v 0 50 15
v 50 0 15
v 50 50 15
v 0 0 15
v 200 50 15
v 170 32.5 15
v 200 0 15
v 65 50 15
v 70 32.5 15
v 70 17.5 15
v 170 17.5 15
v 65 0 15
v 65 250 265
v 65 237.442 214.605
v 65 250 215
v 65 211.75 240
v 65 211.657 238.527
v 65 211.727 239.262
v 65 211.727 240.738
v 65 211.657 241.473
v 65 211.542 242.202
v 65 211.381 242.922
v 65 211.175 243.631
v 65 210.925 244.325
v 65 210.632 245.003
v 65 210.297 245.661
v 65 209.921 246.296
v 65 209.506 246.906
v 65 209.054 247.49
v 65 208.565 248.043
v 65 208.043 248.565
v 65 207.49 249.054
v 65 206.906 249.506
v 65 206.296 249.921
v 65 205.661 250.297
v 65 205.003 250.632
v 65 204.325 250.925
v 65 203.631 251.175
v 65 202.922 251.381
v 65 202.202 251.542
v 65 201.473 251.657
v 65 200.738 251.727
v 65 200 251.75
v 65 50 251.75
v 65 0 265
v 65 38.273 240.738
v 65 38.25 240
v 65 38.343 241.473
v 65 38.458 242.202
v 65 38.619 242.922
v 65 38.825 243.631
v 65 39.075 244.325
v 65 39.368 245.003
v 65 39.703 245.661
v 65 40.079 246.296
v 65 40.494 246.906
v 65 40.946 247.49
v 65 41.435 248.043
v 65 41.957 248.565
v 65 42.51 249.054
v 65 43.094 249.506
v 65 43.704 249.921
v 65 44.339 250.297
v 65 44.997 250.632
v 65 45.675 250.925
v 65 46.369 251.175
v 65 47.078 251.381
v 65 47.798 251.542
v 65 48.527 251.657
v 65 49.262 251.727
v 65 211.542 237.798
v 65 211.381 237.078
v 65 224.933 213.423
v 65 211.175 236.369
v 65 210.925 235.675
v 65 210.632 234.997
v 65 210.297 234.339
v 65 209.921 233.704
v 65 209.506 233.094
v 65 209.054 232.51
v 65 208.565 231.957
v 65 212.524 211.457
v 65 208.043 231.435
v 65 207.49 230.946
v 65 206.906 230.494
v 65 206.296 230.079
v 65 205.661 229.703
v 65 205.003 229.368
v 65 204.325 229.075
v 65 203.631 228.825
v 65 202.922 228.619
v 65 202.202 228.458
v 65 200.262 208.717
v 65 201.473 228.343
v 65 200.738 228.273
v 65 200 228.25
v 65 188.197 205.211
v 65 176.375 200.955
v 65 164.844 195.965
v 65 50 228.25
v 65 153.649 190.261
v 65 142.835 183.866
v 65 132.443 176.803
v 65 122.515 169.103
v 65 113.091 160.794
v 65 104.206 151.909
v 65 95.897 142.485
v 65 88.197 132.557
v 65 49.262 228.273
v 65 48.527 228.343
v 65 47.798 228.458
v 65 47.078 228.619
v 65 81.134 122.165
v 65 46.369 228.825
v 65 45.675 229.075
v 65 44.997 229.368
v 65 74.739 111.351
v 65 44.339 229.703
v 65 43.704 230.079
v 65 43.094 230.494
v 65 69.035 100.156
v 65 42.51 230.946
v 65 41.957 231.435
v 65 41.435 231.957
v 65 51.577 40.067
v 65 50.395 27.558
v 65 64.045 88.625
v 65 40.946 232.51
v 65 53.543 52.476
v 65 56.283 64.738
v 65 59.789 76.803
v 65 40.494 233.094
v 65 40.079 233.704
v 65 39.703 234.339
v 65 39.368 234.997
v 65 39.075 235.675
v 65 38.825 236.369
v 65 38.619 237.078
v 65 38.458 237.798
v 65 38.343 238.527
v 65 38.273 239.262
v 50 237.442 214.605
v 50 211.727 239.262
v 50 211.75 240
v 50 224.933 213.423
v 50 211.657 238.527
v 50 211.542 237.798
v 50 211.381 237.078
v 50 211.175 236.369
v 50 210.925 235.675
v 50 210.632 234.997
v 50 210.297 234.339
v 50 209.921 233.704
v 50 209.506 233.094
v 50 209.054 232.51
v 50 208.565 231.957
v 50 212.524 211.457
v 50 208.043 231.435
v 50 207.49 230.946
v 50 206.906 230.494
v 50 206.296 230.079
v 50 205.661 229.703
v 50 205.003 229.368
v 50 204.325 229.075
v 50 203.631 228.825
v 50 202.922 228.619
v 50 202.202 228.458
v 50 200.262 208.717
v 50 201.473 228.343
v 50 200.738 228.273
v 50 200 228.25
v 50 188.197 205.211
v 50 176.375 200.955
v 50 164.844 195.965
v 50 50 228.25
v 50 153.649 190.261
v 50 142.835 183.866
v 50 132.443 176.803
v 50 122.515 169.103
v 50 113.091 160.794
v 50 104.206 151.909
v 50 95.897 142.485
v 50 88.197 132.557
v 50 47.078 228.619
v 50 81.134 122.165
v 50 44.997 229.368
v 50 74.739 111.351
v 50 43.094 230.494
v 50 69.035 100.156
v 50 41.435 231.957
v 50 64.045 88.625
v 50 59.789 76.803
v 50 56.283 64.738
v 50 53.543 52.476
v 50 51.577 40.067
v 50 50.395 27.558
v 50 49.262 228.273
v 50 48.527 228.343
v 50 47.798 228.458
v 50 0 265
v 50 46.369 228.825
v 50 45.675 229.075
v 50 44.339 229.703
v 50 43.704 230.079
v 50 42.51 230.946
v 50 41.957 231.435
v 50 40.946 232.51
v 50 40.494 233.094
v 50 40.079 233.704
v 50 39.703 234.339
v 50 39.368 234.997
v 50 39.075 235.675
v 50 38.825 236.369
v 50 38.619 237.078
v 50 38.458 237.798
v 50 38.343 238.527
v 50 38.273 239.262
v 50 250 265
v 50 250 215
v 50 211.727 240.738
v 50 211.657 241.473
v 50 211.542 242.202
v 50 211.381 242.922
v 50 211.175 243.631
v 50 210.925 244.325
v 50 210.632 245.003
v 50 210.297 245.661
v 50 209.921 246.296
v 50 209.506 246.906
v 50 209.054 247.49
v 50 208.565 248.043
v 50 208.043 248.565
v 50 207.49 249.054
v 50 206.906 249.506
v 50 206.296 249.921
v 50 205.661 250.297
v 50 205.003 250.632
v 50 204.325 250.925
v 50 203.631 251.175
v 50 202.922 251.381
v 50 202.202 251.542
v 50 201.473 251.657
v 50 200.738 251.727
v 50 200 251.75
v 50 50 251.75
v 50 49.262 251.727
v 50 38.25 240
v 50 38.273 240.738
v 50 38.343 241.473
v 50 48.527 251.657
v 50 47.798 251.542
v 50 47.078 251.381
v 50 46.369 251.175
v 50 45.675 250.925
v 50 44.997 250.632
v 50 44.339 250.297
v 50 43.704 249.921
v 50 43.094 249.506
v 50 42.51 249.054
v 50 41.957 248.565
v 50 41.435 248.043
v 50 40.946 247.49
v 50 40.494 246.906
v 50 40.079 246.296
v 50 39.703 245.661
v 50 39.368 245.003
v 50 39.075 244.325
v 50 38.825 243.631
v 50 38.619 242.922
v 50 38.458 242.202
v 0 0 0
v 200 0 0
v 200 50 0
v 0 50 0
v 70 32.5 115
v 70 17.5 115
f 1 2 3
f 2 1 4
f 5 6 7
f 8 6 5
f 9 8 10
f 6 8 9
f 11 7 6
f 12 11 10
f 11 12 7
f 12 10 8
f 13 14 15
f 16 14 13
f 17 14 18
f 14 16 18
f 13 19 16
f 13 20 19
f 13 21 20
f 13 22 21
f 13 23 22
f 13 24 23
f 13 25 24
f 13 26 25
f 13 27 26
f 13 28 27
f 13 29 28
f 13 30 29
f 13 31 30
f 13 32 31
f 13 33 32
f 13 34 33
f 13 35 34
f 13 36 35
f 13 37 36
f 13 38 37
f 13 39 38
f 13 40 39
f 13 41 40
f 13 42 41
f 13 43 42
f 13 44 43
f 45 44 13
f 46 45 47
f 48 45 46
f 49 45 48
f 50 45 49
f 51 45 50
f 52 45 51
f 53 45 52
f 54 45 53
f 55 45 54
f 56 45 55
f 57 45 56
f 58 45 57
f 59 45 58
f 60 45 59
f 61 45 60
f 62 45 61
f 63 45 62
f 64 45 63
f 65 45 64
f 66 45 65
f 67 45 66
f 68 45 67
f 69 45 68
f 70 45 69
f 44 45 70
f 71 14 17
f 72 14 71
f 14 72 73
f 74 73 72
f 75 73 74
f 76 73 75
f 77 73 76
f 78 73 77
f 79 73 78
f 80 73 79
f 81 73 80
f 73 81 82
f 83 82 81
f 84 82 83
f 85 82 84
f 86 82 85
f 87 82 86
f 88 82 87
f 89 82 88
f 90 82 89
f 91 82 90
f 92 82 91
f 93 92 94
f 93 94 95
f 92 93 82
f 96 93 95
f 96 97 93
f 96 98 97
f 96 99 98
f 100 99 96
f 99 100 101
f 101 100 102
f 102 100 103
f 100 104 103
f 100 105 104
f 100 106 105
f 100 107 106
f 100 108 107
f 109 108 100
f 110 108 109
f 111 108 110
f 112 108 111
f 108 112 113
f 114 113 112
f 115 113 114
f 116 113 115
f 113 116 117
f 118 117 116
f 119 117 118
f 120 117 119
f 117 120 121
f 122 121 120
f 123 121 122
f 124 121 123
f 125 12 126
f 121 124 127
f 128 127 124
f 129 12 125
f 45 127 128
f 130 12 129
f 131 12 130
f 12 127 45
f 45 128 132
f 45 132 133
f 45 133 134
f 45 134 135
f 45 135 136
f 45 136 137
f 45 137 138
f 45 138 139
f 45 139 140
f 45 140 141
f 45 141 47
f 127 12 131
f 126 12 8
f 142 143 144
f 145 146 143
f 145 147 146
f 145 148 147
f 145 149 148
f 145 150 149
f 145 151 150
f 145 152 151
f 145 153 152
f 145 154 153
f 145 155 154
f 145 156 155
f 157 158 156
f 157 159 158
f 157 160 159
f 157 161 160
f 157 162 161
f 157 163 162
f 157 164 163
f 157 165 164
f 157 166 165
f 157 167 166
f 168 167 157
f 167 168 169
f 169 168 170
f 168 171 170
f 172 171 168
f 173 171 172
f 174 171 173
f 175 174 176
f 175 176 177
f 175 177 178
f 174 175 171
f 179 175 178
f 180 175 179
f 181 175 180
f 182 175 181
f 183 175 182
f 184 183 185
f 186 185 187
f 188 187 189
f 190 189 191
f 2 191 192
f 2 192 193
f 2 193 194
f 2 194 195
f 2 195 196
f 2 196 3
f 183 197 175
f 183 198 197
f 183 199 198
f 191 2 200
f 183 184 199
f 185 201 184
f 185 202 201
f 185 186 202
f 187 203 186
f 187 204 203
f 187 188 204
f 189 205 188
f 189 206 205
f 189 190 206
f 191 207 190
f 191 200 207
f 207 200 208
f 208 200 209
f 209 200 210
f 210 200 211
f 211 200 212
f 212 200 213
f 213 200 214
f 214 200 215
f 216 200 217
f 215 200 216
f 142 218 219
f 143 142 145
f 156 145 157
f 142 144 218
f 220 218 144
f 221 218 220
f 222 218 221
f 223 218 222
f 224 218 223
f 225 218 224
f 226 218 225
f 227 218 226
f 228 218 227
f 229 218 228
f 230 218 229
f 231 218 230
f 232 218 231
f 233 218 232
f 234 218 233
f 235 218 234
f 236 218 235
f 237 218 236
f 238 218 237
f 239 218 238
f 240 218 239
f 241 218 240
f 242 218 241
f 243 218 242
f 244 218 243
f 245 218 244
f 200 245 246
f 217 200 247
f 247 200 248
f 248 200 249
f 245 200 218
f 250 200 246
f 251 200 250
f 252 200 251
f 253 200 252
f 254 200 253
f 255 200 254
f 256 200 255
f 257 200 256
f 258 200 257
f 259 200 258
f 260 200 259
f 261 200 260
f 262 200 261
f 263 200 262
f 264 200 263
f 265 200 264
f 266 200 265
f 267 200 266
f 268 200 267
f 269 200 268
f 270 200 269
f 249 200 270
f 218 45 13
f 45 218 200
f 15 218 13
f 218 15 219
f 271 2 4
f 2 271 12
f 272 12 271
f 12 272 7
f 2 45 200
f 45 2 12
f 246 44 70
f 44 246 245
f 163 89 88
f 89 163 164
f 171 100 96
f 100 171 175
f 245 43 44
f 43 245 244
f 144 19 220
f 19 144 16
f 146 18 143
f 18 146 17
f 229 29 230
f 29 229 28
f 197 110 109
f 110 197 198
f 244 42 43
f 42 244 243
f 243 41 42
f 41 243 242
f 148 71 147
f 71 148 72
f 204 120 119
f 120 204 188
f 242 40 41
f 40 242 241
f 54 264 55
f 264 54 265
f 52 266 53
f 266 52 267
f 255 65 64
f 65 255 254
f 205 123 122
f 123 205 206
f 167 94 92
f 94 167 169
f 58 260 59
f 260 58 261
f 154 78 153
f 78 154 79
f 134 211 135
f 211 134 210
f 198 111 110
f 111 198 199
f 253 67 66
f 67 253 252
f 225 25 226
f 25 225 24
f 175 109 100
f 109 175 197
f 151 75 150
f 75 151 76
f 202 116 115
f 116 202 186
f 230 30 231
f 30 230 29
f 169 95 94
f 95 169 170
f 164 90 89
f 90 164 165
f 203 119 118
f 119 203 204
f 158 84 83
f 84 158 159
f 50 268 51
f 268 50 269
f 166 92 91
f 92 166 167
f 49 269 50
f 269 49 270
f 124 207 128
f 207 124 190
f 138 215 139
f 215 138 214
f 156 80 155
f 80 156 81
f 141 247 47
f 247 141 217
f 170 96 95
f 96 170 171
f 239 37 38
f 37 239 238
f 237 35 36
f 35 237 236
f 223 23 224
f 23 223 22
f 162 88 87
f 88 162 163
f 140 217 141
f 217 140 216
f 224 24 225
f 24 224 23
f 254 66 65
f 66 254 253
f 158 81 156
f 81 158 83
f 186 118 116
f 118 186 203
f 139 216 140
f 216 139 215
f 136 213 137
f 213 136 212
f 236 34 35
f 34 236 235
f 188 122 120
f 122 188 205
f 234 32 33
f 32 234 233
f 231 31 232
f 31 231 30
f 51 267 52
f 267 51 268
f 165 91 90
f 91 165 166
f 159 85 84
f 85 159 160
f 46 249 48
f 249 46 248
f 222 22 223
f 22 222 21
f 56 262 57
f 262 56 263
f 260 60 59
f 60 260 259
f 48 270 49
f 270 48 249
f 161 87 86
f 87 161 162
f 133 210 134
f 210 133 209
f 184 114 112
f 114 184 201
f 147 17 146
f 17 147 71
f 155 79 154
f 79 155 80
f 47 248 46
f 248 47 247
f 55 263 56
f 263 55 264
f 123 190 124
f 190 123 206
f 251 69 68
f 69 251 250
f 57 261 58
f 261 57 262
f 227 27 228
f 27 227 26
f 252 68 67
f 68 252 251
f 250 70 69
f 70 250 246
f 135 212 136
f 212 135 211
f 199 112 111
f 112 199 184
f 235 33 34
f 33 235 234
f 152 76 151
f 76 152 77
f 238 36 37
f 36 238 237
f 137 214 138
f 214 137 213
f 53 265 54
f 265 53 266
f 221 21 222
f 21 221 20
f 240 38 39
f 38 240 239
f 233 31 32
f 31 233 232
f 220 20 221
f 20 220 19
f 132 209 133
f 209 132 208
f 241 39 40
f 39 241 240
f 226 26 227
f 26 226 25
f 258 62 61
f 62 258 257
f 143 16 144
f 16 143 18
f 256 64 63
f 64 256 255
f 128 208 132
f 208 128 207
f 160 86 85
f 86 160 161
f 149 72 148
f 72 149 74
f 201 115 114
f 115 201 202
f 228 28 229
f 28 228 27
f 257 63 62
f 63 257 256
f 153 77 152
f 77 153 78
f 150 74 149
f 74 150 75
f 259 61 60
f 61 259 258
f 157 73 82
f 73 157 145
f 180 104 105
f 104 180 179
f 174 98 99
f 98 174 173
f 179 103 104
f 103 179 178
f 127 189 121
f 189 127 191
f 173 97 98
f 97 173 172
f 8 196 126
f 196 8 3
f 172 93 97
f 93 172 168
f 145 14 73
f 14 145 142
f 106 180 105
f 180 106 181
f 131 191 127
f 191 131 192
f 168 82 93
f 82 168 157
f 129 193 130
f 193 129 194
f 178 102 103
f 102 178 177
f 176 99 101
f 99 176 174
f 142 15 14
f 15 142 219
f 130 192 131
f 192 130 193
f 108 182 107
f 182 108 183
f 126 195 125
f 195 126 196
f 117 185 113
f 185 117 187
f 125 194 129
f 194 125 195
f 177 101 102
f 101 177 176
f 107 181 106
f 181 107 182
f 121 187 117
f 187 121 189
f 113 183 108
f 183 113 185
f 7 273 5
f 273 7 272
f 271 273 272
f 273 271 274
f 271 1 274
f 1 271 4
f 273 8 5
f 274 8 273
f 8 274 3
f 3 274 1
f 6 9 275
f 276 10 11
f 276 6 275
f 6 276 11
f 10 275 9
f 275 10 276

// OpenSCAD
// file: lib.scad
module pair(split,rot=0,edge=false){
     module center(){
	  if(edge){
	       translate([split/2,0,0]){
		    children();}}
	  else{
	       children();}}
     rotate([0,0,rot]){
	  center(){
	       translate([split/2,0,0]){
		    children();}
	       translate([-split/2,0,0]){
		    rotate([0,0,180]){
			 children();}}}}}

module tripple(split,rot=0){
     rotate([0,0,90]){
	  children();}
     pair(split,rot){
	  children();}}

module set(count,r){
     for(i=[0:count]){
	  rotate([0,0,360/count*i]){
	       translate([r,0,0]){
		    children();}}}}

module up(distance){
     translate([0,0,distance]){
	  children();}}

module arch(radius,height,thickness){
     cylinder(r=radius,h=thickness);
     translate([0,-radius,0]){
	  cube([height-radius,2*radius,thickness]);}}
// main file
$fn=100;
mm=1; // define units
degrees=1;

use <lib.scad>;

module example_108(){
     plate_thickness=15*mm;
     plate_width=50*mm;
     module bottom_plate()
	  cube([/*plate_length*/200,
		plate_width,
		plate_thickness]);
     module support_strut(){
	  support_size=100*mm;
	  linear_extrude(15){
	       polygon([[0,0],[support_size,0],[0,support_size]]);}}
     module arc_plate(){
	  module slot(){
	       hull(){
		    pair(split=150*mm,rot=90,edge=true){
			 cylinder(r=11.75*mm,h=20*mm);}}}
	  nom_radius=200*mm;// Changed from 195.3 to match picture.
	  side=250;
	  difference(){
	       cube([side,side,plate_thickness]);
	       translate([plate_width/2,plate_width,0]){
		    slot();}
	       translate([side,side,0]){
		    cylinder(r=nom_radius,h=plate_thickness);}}}

     bottom_plate();
     translate([70,15+17.5,plate_thickness])rotate([90,0,0])support_strut();
     translate([50,0,265]){rotate([0,90,0]){arc_plate();}}
}

example_108();
